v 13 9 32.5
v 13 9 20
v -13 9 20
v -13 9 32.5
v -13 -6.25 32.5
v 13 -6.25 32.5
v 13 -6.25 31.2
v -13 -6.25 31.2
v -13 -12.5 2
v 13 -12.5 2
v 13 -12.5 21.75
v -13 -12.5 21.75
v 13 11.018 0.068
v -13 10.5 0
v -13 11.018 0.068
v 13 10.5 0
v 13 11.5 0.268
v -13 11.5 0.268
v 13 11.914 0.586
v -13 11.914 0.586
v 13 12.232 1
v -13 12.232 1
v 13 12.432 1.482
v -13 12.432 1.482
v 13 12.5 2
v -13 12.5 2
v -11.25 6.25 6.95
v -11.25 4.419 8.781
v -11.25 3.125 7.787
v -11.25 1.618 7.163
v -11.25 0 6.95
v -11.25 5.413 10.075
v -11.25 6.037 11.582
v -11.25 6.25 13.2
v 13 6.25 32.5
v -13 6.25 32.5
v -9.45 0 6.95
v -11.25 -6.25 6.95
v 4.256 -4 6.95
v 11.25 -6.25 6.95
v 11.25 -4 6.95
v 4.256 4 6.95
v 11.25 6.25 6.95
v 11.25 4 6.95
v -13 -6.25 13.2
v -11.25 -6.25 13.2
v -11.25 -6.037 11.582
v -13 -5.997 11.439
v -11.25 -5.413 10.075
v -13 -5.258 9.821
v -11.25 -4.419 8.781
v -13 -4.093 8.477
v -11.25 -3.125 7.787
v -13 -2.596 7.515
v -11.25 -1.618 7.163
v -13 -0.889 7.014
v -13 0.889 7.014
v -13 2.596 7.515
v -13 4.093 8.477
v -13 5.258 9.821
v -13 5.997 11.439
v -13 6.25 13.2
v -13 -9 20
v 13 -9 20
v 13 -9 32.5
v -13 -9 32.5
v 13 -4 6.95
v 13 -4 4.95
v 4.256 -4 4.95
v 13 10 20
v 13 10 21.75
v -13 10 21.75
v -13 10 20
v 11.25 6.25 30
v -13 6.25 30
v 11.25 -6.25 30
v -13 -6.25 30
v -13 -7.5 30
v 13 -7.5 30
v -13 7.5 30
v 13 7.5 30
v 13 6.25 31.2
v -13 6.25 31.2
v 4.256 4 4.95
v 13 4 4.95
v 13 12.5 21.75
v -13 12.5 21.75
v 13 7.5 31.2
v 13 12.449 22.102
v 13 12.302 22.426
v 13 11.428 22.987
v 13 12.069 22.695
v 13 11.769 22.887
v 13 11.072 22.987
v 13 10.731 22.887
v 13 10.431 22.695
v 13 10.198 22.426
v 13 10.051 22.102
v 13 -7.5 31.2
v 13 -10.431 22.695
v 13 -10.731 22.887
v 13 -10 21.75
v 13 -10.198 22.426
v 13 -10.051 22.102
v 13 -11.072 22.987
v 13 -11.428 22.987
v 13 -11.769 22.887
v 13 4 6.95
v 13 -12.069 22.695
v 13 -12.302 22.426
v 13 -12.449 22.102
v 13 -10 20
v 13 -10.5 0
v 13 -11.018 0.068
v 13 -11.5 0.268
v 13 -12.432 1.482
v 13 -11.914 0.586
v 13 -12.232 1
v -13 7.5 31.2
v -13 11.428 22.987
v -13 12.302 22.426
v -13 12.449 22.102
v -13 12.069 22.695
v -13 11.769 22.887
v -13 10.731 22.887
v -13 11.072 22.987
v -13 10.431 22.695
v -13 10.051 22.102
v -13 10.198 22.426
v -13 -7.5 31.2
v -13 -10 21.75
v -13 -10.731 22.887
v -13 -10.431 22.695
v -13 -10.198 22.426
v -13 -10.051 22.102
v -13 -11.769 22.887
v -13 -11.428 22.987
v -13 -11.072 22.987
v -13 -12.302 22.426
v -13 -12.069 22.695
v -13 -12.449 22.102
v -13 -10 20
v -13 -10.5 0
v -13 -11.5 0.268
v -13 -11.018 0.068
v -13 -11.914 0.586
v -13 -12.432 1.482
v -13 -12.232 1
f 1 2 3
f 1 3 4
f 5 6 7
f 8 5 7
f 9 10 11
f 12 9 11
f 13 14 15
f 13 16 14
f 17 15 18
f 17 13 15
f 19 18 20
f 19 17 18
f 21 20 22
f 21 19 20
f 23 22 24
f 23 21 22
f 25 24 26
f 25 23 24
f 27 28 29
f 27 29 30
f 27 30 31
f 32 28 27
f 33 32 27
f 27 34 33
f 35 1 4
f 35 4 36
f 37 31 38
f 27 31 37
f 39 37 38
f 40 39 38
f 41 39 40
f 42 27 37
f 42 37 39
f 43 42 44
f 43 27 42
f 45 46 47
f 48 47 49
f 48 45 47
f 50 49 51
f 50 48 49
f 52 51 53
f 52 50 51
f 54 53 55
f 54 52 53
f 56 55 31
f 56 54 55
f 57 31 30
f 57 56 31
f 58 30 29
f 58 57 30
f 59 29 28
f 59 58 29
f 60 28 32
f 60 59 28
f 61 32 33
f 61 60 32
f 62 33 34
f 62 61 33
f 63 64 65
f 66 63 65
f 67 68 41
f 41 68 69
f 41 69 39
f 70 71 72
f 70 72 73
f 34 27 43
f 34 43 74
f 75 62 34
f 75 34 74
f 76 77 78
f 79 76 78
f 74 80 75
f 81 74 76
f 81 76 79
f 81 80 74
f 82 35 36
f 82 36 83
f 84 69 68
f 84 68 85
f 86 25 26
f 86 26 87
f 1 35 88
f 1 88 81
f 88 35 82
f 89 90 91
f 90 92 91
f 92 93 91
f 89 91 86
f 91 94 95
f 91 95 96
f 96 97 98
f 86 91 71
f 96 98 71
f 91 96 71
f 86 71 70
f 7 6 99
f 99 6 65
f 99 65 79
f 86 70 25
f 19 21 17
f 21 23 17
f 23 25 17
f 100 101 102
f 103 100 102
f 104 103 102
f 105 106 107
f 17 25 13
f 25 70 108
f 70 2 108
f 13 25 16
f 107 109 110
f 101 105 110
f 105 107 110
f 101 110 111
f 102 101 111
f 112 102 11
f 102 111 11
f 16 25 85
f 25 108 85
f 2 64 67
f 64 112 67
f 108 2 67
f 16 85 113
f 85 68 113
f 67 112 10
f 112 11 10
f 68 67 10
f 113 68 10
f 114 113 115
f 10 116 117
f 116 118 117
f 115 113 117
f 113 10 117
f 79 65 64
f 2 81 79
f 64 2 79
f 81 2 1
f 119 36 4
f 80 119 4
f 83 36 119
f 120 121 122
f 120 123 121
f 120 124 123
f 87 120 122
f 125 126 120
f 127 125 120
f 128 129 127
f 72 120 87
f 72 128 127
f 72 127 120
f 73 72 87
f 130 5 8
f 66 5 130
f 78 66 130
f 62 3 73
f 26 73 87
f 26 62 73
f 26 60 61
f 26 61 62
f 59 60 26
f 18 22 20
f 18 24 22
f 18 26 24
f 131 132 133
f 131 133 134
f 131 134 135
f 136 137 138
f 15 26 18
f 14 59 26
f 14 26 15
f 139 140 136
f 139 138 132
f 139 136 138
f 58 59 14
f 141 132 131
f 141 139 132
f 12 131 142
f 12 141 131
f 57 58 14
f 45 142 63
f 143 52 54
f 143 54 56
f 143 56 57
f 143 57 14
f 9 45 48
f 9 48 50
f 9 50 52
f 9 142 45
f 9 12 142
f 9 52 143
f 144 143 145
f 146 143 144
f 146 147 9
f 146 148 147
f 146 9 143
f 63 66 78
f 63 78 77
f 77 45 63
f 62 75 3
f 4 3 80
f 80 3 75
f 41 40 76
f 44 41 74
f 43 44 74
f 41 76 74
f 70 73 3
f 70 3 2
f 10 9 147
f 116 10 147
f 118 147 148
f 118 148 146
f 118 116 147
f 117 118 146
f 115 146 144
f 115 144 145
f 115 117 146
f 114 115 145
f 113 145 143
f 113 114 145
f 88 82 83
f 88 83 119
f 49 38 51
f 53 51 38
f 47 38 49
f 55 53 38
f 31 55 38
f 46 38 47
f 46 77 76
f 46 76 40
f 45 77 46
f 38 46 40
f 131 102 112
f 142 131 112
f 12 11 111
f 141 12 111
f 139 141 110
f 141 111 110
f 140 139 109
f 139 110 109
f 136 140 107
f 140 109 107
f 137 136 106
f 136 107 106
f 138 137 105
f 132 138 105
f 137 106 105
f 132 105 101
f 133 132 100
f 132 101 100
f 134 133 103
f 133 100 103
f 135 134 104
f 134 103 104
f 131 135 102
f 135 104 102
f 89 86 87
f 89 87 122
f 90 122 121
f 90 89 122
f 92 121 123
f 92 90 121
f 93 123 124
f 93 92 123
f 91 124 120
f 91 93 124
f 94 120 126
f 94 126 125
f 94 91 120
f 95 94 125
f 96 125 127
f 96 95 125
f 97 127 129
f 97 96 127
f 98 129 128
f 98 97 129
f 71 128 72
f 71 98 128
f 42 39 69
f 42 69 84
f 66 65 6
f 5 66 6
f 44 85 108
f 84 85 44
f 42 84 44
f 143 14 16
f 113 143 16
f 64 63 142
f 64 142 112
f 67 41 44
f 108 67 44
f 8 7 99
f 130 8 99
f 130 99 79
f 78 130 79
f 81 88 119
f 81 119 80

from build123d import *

# Parameters (mm, degrees)
SKETCH_1_W          = 26
SKETCH_1_H          = 25
EXTRUDE_1_DEPTH     = 20
EXTRUDE_3_DEPTH     = 26
SKETCH_4_W          = 26
SKETCH_4_H          = 18
EXTRUDE_4_DEPTH     = 10
SKETCH_5_W          = 22.5
SKETCH_5_H          = 12.5
CUT_EXTRUDE_1_DEPTH = 23.05
CUT_EXTRUDE_5_DEPTH = 3.55
SKETCH_9_W          = 7
SKETCH_9_H          = 8
CUT_EXTRUDE_6_DEPTH = 2
SKETCH_10_W         = 2
SKETCH_10_H         = 8
CUT_EXTRUDE_7_DEPTH = 2
EXTRUDE_5_DEPTH     = 26
FILLET_1_R          = 2


with BuildPart() as part:
    # Эскиз1 → Бобышка-Вытянуть1 (new body)
    with BuildSketch(Plane.XY):
        Rectangle(SKETCH_1_W, SKETCH_1_H)
    extrude(amount=EXTRUDE_1_DEPTH)

    # Эскиз3 → Бобышка-Вытянуть3 (add, through all)
    with BuildSketch(Plane(origin=(13, 0, 0), x_dir=(0, 0, -1), z_dir=(1, 0, 0))):
        with BuildLine():
            Line((-20, 12.5), (-21.75, 12.5))
            ThreePointArc((-21.75, 12.5), (-23, 11.25), (-21.75, 10))
            Line((-21.75, 10), (-20, 10))
            Line((-20, 10), (-20, 12.5))
        make_face()
    extrude_3 = extrude(amount=-EXTRUDE_3_DEPTH)

    # Зеркальное отражение1: Бобышка-Вытянуть3 across plane
    add(extrude_3.mirror(Plane.ZX))

    # Эскиз4 → Бобышка-Вытянуть4 (add)
    with BuildSketch(Plane.XY.offset(20)):
        Rectangle(SKETCH_4_W, SKETCH_4_H)
    extrude(amount=EXTRUDE_4_DEPTH)

    # Эскиз5 → Вырез-Вытянуть1 (cut)
    with BuildSketch(Plane.XY.offset(30)):
        Rectangle(SKETCH_5_W, SKETCH_5_H)
    extrude(amount=-CUT_EXTRUDE_1_DEPTH, mode=Mode.SUBTRACT)

    # Эскиз8 → Вырез-Вытянуть5 (cut)
    with BuildSketch(Plane.ZY.offset(13)):
        with BuildLine():
            Line((30, -6.25), (13.2, -6.25))
            ThreePointArc((13.2, -6.25), (6.95, 0), (13.2, 6.25))
            Line((13.2, 6.25), (30, 6.25))
            Line((30, 6.25), (30, -6.25))
        make_face()
    extrude(amount=-CUT_EXTRUDE_5_DEPTH, mode=Mode.SUBTRACT)

    # Эскиз9 → Вырез-Вытянуть6 (cut)
    with BuildSketch(Plane.XY.offset(6.95)):
        with Locations((7.7560221, 0)):
            Rectangle(SKETCH_9_W, SKETCH_9_H)
    extrude(amount=-CUT_EXTRUDE_6_DEPTH, mode=Mode.SUBTRACT)

    # Эскиз10 → Вырез-Вытянуть7 (cut)
    with BuildSketch(Plane.ZY.offset(-11.2560221)):
        with Locations((5.95, 0)):
            Rectangle(SKETCH_10_W, SKETCH_10_H)
    extrude(amount=-CUT_EXTRUDE_7_DEPTH, mode=Mode.SUBTRACT)

    # Эскиз12 → Бобышка-Вытянуть5 (add, through all)
    with BuildSketch(Plane(origin=(13, 0, 0), x_dir=(0, 0, -1), z_dir=(1, 0, 0))):
        Polygon((-30, 9), (-32.5, 9), (-32.5, 6.25), (-31.2, 6.25), (-31.2, 7.5), (-30, 7.5), align=None)
    extrude_5 = extrude(amount=-EXTRUDE_5_DEPTH)

    # Зеркальное отражение2: Бобышка-Вытянуть5 across plane
    add(extrude_5.mirror(Plane.ZX))

    # Скругление1
    fillet_1_edges = [part.edges().sort_by_distance(p)[0] for p in [
        (0, 12.5, 0),
        (0, -12.5, 0),
    ]]
    fillet(fillet_1_edges, radius=FILLET_1_R)


solid = part.part
